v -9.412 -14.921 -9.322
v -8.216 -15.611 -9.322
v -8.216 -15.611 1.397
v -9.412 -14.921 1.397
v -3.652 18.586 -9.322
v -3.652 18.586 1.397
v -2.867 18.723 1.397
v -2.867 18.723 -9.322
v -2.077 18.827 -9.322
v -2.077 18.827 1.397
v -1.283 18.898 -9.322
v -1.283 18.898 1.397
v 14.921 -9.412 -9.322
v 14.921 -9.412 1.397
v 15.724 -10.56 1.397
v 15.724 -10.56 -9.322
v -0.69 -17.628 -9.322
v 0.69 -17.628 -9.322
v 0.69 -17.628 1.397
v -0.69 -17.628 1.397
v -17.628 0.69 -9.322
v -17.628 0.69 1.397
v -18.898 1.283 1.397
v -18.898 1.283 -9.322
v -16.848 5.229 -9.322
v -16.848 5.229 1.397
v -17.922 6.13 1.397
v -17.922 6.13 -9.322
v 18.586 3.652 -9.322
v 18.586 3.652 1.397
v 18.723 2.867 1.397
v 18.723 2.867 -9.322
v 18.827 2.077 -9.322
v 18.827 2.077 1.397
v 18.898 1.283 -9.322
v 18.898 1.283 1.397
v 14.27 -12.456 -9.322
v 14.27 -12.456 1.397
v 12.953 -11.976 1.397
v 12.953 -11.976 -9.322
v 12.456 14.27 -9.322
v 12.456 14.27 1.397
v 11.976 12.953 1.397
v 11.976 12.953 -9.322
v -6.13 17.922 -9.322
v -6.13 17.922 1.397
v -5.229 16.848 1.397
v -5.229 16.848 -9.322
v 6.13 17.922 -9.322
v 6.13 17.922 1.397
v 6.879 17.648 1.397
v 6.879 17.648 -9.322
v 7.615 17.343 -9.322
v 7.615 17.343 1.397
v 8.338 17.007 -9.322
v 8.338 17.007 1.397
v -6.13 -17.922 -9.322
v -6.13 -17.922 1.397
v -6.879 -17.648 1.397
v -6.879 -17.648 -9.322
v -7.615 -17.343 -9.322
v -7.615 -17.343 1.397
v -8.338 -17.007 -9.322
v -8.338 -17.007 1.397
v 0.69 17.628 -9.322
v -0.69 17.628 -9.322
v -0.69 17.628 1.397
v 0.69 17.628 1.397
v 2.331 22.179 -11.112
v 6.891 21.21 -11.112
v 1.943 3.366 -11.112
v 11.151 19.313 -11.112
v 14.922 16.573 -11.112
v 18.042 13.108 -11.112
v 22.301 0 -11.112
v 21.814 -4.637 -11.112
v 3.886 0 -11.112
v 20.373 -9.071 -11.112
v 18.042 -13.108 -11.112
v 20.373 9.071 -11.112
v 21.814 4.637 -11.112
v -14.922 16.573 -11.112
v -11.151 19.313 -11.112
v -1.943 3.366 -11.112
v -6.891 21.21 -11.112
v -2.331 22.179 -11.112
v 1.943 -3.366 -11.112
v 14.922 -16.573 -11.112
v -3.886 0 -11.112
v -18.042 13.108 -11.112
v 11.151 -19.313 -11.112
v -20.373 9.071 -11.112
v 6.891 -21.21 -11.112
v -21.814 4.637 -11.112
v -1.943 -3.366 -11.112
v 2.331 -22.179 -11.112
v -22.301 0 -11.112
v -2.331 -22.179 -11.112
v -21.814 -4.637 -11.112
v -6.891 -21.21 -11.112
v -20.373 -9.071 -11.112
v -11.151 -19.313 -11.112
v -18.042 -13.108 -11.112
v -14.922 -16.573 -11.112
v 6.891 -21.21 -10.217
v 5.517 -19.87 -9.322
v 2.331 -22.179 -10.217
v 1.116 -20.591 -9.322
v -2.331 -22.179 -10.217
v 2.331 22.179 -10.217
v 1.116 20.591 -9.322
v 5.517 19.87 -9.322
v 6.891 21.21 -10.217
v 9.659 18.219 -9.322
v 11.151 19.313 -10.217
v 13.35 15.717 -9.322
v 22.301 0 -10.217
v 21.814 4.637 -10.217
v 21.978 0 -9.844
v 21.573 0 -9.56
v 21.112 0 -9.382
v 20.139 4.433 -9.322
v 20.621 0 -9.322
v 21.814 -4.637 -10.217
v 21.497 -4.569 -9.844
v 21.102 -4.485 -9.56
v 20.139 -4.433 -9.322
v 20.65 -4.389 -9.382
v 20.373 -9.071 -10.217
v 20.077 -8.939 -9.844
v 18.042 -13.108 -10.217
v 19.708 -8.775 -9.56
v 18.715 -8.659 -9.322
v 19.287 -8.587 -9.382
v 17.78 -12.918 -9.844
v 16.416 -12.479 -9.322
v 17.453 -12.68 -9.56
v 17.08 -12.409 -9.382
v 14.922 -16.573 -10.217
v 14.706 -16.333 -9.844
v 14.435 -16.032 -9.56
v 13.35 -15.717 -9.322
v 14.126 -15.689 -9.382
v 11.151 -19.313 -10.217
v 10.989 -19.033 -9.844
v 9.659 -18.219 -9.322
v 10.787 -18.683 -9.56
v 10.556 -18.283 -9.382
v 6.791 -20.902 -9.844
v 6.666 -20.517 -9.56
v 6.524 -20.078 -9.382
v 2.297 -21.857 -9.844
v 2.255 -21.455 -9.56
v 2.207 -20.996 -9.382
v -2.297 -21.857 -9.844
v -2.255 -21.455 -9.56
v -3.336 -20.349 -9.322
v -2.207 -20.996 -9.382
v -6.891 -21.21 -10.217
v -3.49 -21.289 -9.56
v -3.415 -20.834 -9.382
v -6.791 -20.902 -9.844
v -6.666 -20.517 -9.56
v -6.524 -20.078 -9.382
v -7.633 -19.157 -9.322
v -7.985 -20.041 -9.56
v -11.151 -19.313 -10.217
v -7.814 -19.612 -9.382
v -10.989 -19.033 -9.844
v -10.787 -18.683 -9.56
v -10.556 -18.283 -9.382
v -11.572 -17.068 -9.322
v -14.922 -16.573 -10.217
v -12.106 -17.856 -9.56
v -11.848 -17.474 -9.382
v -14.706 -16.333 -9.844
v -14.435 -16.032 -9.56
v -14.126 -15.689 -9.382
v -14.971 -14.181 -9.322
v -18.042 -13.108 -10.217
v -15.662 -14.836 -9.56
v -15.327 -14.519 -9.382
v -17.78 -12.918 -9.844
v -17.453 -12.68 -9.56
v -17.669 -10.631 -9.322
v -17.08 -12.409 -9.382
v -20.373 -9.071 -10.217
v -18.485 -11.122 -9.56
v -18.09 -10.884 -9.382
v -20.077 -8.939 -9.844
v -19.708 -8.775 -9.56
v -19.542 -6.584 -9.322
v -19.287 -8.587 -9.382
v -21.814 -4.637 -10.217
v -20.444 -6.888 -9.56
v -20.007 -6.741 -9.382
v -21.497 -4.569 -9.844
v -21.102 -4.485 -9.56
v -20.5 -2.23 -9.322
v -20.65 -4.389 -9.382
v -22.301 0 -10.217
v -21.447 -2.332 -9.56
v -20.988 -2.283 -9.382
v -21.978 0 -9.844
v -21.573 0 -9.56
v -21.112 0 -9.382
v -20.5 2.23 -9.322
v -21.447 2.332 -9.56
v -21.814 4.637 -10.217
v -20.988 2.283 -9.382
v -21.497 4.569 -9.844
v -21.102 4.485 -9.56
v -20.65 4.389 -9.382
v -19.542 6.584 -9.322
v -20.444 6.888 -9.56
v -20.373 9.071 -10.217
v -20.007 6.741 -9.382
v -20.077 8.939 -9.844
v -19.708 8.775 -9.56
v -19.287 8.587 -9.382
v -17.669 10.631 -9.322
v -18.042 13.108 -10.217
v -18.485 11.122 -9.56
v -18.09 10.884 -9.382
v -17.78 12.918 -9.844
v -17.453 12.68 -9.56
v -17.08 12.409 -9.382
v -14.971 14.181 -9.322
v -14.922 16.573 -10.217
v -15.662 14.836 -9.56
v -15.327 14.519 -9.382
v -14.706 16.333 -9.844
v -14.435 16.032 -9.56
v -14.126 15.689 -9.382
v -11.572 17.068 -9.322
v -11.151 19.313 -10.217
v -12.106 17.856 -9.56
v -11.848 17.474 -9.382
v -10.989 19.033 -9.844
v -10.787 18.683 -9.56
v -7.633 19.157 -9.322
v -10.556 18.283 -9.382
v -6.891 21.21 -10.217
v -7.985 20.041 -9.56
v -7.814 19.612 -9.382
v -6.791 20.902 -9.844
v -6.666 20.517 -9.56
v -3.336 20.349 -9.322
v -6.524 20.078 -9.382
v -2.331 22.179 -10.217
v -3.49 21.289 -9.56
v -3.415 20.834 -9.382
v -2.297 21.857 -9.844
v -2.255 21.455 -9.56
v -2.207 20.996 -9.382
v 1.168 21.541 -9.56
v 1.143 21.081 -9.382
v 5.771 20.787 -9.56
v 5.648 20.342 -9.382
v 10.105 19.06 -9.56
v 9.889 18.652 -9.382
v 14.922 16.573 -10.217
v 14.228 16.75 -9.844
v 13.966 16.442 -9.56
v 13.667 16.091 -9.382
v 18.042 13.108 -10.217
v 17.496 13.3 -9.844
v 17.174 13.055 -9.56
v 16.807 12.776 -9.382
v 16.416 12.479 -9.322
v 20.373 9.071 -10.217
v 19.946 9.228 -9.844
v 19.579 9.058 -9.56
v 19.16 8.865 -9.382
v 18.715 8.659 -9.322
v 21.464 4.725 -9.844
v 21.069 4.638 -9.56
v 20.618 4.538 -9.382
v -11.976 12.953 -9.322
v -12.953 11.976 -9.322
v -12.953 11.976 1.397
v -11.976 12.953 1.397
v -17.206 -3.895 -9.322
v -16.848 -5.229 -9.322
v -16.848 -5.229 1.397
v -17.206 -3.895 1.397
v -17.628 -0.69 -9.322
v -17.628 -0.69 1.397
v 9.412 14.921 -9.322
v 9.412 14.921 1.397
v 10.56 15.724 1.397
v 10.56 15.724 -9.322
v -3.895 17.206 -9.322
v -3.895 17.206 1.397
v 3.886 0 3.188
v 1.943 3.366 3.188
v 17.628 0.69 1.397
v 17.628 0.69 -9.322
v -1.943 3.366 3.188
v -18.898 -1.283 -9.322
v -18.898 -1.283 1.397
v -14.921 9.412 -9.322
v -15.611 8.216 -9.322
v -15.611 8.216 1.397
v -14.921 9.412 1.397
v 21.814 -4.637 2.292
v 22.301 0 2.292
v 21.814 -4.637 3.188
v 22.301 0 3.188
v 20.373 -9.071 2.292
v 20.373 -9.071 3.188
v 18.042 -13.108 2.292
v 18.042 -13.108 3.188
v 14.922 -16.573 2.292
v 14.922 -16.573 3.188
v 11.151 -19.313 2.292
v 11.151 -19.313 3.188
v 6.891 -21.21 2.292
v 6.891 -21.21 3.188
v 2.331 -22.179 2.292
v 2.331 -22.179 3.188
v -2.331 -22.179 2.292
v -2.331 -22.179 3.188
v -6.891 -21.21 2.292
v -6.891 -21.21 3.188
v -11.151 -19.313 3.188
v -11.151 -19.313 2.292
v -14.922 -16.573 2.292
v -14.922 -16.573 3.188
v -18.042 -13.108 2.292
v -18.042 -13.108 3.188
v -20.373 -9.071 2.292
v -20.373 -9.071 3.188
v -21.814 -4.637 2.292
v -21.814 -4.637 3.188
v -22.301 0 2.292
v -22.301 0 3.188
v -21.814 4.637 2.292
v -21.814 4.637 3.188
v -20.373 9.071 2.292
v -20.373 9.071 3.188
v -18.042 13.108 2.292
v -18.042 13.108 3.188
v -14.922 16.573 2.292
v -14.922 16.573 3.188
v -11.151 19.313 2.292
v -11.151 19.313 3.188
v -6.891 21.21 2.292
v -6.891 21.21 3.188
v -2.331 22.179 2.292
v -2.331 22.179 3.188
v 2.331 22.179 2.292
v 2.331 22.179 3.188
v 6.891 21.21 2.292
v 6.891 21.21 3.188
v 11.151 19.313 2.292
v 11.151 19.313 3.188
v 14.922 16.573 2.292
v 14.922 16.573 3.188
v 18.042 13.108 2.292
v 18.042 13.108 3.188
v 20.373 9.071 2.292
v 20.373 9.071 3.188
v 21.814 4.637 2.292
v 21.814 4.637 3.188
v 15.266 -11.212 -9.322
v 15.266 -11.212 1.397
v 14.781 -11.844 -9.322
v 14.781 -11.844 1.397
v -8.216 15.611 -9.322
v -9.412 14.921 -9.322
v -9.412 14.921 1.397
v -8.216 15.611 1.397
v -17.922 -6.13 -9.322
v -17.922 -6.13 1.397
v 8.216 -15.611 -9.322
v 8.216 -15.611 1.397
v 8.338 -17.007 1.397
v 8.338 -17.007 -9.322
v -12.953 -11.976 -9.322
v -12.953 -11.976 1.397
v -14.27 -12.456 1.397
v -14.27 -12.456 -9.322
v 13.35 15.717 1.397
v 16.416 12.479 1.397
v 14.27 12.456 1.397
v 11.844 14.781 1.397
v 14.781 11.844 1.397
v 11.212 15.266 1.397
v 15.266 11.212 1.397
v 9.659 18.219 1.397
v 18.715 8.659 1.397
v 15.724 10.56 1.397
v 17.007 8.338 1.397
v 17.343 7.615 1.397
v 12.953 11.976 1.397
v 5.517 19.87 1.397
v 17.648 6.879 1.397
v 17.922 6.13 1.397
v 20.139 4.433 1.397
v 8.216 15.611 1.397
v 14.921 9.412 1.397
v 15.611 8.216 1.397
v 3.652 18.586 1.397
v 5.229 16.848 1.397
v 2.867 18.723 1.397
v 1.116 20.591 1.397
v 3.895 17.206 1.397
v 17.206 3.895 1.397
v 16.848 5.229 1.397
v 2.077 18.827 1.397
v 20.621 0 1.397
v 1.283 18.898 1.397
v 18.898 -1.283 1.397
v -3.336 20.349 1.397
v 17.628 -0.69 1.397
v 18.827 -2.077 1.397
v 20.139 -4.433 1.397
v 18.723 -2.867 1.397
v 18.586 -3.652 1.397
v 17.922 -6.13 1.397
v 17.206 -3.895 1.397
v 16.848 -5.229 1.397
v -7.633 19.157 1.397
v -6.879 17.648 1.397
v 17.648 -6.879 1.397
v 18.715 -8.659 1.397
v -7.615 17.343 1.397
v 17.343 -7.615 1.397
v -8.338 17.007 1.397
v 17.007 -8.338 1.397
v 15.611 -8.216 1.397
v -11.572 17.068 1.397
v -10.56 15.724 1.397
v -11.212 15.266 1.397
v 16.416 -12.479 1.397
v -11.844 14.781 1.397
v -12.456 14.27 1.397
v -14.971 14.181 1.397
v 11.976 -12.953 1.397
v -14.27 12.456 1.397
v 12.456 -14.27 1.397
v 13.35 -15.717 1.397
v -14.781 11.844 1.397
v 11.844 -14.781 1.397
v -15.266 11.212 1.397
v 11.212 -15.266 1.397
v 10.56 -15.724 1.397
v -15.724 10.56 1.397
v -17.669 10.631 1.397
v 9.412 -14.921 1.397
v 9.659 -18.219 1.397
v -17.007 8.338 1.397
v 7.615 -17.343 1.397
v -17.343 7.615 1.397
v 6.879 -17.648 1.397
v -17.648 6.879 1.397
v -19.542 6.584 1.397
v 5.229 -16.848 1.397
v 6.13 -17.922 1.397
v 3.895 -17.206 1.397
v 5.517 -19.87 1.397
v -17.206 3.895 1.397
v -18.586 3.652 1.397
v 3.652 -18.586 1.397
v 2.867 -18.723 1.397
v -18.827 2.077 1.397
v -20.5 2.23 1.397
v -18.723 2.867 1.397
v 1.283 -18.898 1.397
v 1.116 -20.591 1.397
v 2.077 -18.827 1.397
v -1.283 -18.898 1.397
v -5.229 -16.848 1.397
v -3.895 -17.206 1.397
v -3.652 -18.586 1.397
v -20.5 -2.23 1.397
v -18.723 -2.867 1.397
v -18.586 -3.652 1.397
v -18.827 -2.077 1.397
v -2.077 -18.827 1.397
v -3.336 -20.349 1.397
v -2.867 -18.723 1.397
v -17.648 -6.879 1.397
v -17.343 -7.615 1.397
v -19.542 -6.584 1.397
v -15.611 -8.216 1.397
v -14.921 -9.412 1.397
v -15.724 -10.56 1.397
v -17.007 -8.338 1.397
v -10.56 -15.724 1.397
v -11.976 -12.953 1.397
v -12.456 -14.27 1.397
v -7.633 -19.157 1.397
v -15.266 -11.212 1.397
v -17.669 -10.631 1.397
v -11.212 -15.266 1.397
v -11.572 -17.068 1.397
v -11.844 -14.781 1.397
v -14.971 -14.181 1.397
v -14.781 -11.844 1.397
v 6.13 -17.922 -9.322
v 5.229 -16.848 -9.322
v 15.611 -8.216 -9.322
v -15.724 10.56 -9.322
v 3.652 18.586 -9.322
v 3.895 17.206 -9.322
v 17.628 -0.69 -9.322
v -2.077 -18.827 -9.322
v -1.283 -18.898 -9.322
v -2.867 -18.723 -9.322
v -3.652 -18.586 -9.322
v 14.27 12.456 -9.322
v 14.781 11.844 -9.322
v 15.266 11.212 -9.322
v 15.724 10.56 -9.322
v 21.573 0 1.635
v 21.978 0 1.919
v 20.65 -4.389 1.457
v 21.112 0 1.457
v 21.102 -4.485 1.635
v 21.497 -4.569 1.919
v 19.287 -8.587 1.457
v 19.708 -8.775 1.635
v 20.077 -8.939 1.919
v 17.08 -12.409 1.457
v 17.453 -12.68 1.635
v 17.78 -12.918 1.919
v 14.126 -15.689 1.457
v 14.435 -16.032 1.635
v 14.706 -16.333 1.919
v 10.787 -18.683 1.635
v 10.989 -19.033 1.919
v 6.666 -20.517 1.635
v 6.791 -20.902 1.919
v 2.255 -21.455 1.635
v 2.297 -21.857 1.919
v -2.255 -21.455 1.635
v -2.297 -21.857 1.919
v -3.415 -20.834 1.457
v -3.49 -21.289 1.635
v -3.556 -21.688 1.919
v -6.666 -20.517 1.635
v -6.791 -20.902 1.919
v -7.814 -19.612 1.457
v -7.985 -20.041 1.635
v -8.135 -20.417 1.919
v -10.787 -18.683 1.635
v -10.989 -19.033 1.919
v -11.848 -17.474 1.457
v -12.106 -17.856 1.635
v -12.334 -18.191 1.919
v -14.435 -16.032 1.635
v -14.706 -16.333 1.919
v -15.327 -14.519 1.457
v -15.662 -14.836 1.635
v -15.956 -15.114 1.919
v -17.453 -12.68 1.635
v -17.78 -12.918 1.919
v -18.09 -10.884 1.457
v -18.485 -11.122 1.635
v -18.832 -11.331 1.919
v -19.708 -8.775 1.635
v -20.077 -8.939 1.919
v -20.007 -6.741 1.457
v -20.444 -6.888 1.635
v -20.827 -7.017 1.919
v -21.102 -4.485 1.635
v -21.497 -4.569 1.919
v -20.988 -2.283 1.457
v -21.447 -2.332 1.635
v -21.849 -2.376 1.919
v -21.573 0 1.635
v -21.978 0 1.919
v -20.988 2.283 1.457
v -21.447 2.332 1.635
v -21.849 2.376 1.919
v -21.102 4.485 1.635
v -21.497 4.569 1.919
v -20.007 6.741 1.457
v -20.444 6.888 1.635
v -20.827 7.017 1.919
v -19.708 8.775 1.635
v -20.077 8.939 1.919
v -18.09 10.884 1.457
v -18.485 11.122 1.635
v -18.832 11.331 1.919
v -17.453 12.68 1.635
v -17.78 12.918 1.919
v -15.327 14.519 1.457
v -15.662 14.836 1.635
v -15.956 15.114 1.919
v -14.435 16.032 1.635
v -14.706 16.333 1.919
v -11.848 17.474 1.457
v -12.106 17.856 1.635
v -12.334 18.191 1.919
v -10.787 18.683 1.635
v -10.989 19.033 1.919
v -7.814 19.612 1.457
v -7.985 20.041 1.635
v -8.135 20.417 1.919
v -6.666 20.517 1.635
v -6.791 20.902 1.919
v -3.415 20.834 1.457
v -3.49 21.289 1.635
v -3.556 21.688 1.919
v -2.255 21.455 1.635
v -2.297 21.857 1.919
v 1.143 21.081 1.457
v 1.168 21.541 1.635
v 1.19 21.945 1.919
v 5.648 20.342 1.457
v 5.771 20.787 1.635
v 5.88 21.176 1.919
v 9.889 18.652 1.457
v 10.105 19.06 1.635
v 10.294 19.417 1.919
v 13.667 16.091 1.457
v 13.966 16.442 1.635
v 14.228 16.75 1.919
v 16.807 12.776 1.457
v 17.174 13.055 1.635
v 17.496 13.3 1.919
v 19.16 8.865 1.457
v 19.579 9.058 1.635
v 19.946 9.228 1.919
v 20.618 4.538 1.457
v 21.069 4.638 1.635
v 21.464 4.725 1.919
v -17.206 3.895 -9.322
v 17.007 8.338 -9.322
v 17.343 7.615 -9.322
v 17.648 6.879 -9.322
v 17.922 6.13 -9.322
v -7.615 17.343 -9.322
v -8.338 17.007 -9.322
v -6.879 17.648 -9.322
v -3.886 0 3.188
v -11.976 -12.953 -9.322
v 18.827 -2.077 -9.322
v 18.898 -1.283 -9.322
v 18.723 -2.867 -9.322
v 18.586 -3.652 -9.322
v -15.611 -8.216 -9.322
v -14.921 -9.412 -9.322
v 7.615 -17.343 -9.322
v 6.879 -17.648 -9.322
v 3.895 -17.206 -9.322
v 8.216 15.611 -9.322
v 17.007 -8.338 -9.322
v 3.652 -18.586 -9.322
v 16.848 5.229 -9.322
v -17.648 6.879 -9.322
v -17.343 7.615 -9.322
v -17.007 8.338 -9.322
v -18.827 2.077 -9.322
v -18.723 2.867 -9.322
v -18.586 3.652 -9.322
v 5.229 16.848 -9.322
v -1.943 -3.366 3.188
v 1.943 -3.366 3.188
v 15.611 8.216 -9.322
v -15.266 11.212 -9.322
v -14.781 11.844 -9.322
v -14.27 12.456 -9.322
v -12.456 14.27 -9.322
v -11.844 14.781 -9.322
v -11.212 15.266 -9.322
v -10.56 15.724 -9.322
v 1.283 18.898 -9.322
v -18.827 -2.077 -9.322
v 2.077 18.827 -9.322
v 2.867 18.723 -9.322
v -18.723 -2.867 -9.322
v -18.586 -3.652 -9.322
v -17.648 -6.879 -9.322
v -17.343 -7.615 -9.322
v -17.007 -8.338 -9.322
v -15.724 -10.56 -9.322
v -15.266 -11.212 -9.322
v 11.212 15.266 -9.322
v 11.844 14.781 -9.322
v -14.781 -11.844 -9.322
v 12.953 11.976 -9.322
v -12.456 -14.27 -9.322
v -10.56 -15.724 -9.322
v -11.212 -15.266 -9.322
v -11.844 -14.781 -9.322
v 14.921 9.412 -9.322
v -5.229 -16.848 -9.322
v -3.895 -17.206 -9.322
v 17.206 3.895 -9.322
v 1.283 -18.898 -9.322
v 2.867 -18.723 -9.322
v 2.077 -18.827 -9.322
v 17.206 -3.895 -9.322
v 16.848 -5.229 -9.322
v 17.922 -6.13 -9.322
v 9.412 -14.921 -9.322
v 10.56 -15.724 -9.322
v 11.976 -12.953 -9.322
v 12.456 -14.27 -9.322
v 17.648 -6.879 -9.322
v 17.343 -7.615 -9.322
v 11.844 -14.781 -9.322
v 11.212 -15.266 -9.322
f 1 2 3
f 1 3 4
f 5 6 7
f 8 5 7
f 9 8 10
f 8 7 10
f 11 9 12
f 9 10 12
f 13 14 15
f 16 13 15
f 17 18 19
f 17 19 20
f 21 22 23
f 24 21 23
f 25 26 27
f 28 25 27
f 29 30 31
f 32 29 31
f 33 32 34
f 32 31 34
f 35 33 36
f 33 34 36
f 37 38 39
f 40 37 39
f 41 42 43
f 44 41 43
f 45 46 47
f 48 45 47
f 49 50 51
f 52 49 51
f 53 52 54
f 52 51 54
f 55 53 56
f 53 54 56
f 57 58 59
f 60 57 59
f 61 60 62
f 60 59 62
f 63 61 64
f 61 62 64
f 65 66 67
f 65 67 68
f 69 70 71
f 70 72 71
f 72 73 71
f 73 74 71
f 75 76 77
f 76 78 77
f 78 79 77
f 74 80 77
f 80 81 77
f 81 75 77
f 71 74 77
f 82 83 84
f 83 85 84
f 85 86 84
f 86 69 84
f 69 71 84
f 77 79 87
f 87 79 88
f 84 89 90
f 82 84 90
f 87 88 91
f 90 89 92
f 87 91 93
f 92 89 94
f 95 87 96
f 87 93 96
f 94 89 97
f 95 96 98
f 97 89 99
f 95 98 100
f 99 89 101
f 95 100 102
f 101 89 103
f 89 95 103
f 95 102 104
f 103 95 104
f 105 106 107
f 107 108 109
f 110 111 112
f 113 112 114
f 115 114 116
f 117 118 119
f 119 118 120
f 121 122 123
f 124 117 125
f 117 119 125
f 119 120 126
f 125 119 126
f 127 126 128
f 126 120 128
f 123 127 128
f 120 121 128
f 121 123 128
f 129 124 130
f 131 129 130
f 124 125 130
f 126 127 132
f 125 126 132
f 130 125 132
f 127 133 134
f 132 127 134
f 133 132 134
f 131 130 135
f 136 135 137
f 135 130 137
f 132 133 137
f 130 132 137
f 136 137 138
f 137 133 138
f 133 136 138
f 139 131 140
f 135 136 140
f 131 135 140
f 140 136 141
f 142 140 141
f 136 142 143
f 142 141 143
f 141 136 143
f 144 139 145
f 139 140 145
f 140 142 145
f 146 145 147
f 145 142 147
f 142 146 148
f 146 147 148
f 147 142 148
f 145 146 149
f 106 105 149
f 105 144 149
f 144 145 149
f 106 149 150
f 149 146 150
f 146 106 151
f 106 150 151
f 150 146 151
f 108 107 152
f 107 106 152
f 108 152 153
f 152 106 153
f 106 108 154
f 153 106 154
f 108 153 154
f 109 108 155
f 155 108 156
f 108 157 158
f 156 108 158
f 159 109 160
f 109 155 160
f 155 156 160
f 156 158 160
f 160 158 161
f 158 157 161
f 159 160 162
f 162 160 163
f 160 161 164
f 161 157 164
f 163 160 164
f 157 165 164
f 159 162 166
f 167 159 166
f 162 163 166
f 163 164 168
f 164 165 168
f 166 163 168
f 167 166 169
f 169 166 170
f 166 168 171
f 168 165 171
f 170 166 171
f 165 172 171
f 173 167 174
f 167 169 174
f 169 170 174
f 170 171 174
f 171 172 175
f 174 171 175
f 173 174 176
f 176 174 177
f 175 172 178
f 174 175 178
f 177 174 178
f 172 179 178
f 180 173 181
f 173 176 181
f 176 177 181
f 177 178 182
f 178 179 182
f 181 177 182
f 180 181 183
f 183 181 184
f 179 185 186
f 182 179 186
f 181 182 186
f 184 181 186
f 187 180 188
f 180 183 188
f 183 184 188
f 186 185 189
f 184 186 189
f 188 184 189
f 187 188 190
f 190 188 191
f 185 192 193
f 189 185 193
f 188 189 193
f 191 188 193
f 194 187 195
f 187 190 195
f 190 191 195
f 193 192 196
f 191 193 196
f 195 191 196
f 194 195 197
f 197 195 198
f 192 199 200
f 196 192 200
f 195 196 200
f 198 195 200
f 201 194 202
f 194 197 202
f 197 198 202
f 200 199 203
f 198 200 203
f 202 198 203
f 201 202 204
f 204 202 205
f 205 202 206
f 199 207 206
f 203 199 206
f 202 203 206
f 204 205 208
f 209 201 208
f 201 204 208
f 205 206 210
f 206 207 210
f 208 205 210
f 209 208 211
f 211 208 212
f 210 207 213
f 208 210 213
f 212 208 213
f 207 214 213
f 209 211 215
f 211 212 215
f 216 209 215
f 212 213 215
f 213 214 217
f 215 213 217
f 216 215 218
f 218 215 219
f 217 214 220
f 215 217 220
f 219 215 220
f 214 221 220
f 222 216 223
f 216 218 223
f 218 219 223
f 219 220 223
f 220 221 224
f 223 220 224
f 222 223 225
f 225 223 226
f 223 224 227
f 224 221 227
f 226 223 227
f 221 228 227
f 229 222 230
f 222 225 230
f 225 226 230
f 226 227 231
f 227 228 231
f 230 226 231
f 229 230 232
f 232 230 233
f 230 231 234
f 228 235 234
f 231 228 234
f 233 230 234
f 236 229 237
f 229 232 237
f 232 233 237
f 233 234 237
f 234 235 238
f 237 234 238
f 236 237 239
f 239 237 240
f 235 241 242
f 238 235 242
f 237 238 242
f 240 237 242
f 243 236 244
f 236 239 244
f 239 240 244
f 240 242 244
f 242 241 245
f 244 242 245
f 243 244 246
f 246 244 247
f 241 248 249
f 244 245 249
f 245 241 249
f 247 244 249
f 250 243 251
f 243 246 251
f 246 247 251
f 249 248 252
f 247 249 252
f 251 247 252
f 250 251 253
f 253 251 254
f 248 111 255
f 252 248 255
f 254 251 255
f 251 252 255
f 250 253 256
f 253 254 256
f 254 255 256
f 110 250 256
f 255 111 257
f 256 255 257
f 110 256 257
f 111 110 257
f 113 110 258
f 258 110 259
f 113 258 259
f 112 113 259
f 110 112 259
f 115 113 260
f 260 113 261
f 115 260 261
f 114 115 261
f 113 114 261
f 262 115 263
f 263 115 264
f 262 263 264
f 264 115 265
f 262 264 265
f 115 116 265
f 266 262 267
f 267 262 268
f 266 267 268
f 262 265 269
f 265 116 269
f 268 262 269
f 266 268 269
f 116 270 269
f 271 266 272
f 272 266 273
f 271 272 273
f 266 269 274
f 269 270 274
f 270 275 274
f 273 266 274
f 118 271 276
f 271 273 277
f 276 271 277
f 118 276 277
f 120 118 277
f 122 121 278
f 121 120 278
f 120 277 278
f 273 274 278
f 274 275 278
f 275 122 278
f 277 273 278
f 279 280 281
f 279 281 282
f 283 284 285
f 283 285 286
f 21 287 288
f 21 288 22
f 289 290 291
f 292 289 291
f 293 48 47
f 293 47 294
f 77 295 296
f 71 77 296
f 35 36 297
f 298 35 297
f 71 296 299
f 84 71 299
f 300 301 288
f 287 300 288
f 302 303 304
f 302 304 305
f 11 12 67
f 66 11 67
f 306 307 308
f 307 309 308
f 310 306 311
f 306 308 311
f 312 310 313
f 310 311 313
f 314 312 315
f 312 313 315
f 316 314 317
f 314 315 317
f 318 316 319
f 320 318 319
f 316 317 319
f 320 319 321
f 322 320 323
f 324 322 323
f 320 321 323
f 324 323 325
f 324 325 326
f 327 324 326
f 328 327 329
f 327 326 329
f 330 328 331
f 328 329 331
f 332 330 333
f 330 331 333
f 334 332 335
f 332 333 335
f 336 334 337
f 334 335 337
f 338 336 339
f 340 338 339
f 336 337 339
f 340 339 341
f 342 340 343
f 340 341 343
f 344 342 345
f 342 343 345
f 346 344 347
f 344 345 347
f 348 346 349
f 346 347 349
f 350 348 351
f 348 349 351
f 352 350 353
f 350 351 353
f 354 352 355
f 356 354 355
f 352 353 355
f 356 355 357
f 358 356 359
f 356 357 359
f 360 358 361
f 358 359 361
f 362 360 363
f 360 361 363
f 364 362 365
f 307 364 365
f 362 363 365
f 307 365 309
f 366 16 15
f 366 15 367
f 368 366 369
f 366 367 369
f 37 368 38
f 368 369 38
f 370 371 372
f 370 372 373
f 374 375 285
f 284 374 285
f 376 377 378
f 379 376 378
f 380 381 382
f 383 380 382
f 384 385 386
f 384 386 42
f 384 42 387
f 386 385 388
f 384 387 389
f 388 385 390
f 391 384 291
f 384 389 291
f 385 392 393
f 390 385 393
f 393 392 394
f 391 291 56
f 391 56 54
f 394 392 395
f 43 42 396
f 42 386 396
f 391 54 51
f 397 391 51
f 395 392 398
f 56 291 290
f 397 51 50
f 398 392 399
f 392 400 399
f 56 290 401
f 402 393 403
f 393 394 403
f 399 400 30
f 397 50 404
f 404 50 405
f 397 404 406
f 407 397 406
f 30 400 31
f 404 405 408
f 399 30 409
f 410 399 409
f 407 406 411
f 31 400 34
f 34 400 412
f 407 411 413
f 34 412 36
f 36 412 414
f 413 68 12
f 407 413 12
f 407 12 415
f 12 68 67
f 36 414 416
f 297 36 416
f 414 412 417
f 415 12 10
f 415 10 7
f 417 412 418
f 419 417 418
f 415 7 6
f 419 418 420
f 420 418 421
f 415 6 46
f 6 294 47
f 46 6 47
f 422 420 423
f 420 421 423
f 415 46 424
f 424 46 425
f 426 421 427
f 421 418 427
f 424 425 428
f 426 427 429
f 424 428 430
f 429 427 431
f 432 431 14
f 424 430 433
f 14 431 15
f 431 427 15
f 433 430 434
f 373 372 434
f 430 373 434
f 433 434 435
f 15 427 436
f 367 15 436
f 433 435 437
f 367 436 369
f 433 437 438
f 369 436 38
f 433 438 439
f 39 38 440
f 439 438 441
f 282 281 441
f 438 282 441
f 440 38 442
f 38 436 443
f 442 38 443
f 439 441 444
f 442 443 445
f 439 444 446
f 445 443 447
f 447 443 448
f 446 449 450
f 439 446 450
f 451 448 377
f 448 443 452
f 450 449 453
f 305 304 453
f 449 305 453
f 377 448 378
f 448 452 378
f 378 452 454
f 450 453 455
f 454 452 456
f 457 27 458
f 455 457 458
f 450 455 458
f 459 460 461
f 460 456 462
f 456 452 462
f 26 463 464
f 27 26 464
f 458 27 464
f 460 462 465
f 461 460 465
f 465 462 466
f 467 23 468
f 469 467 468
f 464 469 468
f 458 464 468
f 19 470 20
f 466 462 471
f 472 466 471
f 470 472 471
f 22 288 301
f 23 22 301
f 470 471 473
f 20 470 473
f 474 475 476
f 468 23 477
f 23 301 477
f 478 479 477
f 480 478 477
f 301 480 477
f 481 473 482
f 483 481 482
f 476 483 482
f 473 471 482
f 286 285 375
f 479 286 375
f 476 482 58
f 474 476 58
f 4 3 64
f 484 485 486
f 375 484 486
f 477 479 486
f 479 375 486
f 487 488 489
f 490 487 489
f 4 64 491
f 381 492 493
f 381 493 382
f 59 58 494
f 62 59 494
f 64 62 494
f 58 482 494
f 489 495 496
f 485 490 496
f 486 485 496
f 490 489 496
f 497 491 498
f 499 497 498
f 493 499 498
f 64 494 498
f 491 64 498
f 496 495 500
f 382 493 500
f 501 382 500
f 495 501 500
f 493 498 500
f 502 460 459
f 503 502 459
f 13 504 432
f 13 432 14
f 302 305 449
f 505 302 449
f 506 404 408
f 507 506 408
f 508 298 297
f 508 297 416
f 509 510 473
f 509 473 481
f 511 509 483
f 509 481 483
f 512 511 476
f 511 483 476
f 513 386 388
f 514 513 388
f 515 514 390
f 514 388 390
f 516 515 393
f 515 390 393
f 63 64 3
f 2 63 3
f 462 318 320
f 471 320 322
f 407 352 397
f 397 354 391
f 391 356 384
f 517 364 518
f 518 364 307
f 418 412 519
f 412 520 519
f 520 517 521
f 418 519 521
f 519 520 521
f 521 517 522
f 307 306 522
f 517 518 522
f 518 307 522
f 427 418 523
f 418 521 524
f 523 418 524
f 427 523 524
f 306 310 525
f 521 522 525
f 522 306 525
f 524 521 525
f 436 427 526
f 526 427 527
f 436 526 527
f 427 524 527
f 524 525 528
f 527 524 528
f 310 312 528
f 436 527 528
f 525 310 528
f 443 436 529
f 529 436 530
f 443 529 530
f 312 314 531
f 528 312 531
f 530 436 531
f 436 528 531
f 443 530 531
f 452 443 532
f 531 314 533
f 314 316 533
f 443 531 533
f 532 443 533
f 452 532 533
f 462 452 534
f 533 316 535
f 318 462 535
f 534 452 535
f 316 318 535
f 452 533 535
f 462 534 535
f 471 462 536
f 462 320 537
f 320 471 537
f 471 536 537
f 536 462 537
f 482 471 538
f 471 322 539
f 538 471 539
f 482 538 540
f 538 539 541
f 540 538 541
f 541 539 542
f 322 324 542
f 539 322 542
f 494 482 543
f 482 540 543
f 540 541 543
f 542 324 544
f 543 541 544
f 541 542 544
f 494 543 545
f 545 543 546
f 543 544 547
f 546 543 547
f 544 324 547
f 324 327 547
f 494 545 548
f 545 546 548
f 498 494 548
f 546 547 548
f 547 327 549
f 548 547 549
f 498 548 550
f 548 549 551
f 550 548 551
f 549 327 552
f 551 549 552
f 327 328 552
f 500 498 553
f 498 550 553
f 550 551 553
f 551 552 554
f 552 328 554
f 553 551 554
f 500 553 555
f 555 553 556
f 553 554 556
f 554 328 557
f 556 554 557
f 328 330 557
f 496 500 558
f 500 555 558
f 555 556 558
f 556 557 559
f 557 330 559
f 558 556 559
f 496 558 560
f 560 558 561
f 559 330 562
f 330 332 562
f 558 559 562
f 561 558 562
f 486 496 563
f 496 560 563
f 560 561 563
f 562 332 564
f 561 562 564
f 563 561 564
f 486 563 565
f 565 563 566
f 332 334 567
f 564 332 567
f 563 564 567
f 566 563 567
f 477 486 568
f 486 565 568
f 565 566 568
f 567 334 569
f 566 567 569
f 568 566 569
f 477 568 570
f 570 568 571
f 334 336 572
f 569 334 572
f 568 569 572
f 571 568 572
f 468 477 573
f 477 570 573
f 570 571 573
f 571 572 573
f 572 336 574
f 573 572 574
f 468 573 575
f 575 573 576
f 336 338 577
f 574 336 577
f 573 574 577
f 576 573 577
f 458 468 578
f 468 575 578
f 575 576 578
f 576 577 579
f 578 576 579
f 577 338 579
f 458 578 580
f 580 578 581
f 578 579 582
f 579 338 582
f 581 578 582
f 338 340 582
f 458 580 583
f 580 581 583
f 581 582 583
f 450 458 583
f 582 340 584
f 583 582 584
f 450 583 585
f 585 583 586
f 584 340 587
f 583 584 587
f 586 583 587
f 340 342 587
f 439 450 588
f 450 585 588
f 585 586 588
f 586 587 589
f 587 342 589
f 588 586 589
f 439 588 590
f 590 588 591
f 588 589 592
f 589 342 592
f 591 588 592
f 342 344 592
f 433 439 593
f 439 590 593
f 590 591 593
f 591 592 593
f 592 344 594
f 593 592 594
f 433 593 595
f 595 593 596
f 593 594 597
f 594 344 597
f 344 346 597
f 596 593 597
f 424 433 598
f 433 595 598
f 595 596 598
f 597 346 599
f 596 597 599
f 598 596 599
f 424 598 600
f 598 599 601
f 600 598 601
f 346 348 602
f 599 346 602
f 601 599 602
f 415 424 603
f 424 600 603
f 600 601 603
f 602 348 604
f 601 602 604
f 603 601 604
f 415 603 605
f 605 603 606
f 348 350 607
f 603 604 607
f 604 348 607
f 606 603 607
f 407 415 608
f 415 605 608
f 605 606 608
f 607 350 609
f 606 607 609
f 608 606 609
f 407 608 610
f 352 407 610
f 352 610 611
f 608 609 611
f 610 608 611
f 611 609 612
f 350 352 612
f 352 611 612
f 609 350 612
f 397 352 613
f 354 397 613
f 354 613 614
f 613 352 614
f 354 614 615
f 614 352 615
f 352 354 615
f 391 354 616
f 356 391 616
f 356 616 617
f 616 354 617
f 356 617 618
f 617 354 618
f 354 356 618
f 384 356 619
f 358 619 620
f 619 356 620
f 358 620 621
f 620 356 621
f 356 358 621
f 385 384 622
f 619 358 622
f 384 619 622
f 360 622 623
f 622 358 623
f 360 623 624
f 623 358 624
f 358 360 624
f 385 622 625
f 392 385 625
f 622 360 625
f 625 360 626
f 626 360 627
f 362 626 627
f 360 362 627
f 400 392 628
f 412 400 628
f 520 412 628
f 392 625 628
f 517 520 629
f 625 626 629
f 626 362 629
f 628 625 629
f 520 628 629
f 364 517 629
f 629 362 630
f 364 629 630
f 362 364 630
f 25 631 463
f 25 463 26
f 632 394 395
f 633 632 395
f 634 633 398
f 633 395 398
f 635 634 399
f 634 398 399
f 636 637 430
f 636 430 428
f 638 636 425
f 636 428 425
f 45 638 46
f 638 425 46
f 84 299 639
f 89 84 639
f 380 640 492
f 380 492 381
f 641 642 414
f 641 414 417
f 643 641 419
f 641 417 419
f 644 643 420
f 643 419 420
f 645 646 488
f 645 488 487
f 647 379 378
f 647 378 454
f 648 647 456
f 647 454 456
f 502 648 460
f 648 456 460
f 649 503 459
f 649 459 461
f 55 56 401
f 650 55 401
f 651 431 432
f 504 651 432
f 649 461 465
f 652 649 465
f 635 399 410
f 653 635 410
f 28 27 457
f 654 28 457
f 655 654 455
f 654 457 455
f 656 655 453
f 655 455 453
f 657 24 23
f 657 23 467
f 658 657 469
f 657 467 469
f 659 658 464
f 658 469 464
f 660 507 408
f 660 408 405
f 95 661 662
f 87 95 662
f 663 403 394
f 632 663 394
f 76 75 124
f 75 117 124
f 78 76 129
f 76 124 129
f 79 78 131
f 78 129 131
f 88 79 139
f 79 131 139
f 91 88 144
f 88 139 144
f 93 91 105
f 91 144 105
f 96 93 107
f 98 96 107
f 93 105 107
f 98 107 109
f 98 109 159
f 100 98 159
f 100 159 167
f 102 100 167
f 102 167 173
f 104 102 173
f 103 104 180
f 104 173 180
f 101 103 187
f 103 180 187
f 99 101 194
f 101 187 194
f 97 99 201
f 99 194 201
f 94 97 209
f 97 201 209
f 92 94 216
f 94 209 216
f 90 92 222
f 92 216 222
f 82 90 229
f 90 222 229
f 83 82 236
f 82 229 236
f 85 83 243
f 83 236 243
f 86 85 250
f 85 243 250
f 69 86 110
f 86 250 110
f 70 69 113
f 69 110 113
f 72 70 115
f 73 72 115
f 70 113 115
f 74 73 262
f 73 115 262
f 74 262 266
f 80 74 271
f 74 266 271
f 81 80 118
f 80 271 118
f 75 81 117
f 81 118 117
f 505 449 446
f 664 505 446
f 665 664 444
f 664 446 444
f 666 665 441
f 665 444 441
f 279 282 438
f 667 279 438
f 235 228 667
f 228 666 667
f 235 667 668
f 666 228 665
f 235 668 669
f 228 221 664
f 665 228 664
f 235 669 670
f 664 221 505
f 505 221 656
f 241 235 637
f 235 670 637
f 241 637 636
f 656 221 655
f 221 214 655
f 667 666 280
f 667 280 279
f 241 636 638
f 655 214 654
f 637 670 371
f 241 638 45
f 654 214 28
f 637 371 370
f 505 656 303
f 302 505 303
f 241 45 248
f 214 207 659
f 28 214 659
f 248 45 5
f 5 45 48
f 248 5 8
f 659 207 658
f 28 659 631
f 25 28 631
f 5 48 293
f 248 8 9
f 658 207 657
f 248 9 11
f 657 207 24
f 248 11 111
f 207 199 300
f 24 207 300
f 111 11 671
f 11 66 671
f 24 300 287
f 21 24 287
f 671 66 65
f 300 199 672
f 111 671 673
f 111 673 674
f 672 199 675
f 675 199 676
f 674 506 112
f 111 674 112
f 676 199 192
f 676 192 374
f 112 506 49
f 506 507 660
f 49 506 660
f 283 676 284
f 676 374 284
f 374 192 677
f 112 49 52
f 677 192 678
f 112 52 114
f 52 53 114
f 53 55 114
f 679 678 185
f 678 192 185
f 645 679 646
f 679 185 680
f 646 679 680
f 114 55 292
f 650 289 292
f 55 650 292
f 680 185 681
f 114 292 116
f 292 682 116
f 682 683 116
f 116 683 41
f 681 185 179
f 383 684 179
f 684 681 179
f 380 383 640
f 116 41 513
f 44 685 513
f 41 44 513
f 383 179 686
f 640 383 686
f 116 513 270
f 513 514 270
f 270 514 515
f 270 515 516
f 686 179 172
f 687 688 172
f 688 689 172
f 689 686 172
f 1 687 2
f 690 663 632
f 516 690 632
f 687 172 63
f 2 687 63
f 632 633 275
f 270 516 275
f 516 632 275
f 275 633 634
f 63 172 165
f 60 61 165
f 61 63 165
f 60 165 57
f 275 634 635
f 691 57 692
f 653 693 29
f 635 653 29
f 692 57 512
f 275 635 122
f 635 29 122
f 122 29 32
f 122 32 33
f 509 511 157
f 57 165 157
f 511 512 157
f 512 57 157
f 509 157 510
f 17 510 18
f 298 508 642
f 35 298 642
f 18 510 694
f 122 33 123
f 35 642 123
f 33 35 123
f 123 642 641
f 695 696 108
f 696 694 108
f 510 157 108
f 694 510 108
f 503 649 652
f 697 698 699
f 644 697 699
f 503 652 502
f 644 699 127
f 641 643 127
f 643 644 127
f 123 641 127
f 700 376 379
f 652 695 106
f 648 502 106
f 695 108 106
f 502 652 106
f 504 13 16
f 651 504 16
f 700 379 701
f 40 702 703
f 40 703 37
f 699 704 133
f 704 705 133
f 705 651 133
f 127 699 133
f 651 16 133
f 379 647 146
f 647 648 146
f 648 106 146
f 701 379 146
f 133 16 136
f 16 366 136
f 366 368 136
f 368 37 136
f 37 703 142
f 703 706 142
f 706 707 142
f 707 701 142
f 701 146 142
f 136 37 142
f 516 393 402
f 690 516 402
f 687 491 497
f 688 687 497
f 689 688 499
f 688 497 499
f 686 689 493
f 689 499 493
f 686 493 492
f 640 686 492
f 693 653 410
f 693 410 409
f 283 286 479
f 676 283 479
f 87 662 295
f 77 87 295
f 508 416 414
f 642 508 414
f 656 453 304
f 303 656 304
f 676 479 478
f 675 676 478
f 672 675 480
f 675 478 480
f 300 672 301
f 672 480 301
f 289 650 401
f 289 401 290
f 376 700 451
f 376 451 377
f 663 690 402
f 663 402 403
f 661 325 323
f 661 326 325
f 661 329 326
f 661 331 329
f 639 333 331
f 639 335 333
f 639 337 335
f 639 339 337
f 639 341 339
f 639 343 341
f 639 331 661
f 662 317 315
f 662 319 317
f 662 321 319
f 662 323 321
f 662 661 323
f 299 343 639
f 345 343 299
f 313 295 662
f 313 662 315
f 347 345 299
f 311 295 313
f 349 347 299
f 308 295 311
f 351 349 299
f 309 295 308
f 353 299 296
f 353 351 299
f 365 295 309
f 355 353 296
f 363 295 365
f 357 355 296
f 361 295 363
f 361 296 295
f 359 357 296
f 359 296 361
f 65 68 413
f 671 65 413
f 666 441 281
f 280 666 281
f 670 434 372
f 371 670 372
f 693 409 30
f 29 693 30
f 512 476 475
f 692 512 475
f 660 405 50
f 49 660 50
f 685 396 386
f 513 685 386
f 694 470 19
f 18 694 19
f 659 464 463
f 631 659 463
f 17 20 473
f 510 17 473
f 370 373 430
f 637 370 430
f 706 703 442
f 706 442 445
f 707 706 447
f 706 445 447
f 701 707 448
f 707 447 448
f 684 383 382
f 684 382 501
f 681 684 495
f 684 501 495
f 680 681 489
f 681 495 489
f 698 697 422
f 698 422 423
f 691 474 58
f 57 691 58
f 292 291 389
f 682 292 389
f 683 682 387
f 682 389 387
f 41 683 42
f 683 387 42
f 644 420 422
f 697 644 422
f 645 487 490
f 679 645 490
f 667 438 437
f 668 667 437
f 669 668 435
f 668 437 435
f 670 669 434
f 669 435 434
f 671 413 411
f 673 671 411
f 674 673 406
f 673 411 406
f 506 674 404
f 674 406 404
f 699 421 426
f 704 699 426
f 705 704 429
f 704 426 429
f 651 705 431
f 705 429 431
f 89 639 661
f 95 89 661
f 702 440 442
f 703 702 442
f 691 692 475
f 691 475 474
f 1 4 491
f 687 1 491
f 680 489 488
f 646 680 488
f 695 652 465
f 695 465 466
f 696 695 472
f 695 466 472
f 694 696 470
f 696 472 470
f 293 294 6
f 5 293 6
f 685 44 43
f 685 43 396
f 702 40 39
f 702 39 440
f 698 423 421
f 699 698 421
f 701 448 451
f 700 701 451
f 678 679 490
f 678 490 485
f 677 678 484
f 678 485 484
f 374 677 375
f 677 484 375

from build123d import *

# Parameters (mm, degrees)
CUT_EXTRUDE1_START = 1.397
CUT_EXTRUDE1_DEPTH = 10.7188
CIRPATTERN1_COUNT  = 24
SKETCH4_R          = 1.5875
CUT_EXTRUDE2_DEPTH = 34.439119294
CUT_EXTRUDE3_DEPTH = 1.190625
CIRPATTERN2_COUNT  = 2
CIRPATTERN2_ANGLE  = 90
SKETCH7_R          = 13.5001
CUT_EXTRUDE4_DEPTH = 7.9248
CUT_EXTRUDE5_DEPTH = 35.629218341


with BuildPart() as part:
    # Sketch2 → Revolve1 (revolve)
    with BuildSketch(Plane(origin=(0, 0, 0), x_dir=(0, 0, -1), z_dir=(1, 0, 0)), mode=Mode.PRIVATE) as revolve1_sk:
        with BuildLine():
            Line((-11.1125, 3.175), (11.1125, 3.175))
            Line((11.1125, 3.175), (11.1125, 22.3012))
            Line((11.1125, 22.3012), (10.21715, 22.3012))
            ThreePointArc((10.21715, 22.3012), (9.559608575, 21.573014266), (9.3218, 20.621141234))
            Line((9.3218, 20.621141234), (9.3218, 18.941082468))
            Line((9.3218, 18.941082468), (-1.397, 18.941082468))
            Line((-1.397, 18.941082468), (-1.397, 20.621141234))
            ThreePointArc((-1.397, 20.621141234), (-1.634808575, 21.573014266), (-2.29235, 22.3012))
            Line((-2.29235, 22.3012), (-3.1877, 22.3012))
            Line((-3.1877, 22.3012), (-3.1877, 13.5001))
            Line((-3.1877, 13.5001), (-11.1125, 13.5001))
            Line((-11.1125, 13.5001), (-11.1125, 3.175))
        make_face()
    revolve(revolve1_sk.sketch.rotate(Axis((0, 0, 11.1125), (0, 0, -1)), 90), axis=Axis((0, 0, 11.1125), (0, 0, -1)))

    # Sketch3 → Cut-Extrude1 (cut)
    with BuildSketch(Plane.XY.offset(CUT_EXTRUDE1_START)):
        with BuildLine():
            Line((-0.690489274, 17.6276), (0.690489274, 17.6276))
            Line((0.690489274, 17.6276), (1.2827, 18.8976))
            ThreePointArc((1.2827, 18.8976), (0, 18.941082468), (-1.2827, 18.8976))
            Line((-1.2827, 18.8976), (-0.690489274, 17.6276))
        make_face()
    cut_extrude1 = extrude(amount=-CUT_EXTRUDE1_DEPTH, mode=Mode.SUBTRACT)

    # CirPattern1: Cut-Extrude1 ×24 about axis
    cirpattern1_axis = Axis((0, 0, 0), (0, 0, 1))
    for i in range(1, CIRPATTERN1_COUNT):
        add(cut_extrude1.rotate(cirpattern1_axis, i * 360 / CIRPATTERN1_COUNT), mode=Mode.SUBTRACT)

    # Sketch4 → Cut-Extrude2 (cut, through all)
    with BuildSketch(Plane(origin=(0, 0, 0), x_dir=(1, 0, 0), z_dir=(0, 1, 0))):
        with Locations(Location((0, -7.1501, 0), (0, 0, 90))):
            Circle(SKETCH4_R)
    cut_extrude2 = extrude(amount=CUT_EXTRUDE2_DEPTH, mode=Mode.SUBTRACT)

    # Sketch5 → Revolve2 (revolve)
    with BuildSketch(Plane.XY.offset(7.1501), mode=Mode.PRIVATE) as revolve2_sk:
        Polygon((1.0795, 13.406436654), (1.5875, 12.898436654), (1.5875, 3.81), (0.9525, 3.175), (0, 3.175), (0, 13.406436654), align=None)
    revolve2 = revolve(revolve2_sk.sketch.rotate(Axis((0, 0, 7.1501), (0, 1, 0)), 90), axis=Axis((0, 0, 7.1501), (0, 1, 0)))

    # Sketch6 → Cut-Extrude3 (cut)
    with BuildSketch(Plane(origin=(0, 13.406436654, 0), x_dir=(1, 0, 0), z_dir=(0, 1, 0))):
        Polygon((0, -6.233556448), (-0.79375, -6.691828224), (-0.79375, -7.608371776), (0, -8.066643552), (0.79375, -7.608371776), (0.79375, -6.691828224), align=None)
    cut_extrude3 = extrude(amount=-CUT_EXTRUDE3_DEPTH, mode=Mode.SUBTRACT)

    # CirPattern2: Cut-Extrude2, Revolve2, Cut-Extrude3 ×2 about axis
    cirpattern2_axis = Axis((0, 0, 0), (0, 0, -1))
    add([cut_extrude2.rotate(cirpattern2_axis, i * CIRPATTERN2_ANGLE / (CIRPATTERN2_COUNT - 1)) for i in range(1, CIRPATTERN2_COUNT)], mode=Mode.SUBTRACT)
    add([revolve2.rotate(cirpattern2_axis, i * CIRPATTERN2_ANGLE / (CIRPATTERN2_COUNT - 1)) for i in range(1, CIRPATTERN2_COUNT)])
    add([cut_extrude3.rotate(cirpattern2_axis, i * CIRPATTERN2_ANGLE / (CIRPATTERN2_COUNT - 1)) for i in range(1, CIRPATTERN2_COUNT)], mode=Mode.SUBTRACT)

    # Sketch7 → Cut-Extrude4 (cut)
    with BuildSketch(Plane.XY.offset(11.1125)):
        Circle(SKETCH7_R)
    extrude(amount=-CUT_EXTRUDE4_DEPTH, mode=Mode.SUBTRACT)

    # Sketch8 → Cut-Extrude5 (cut, through all)
    with BuildSketch(Plane.XY.offset(3.1877)):
        Polygon((3.886144662, 0), (1.943072331, 3.3655), (-1.943072331, 3.3655), (-3.886144662, 0), (-1.943072331, -3.3655), (1.943072331, -3.3655), align=None)
    extrude(amount=-CUT_EXTRUDE5_DEPTH, mode=Mode.SUBTRACT)


solid = part.part
